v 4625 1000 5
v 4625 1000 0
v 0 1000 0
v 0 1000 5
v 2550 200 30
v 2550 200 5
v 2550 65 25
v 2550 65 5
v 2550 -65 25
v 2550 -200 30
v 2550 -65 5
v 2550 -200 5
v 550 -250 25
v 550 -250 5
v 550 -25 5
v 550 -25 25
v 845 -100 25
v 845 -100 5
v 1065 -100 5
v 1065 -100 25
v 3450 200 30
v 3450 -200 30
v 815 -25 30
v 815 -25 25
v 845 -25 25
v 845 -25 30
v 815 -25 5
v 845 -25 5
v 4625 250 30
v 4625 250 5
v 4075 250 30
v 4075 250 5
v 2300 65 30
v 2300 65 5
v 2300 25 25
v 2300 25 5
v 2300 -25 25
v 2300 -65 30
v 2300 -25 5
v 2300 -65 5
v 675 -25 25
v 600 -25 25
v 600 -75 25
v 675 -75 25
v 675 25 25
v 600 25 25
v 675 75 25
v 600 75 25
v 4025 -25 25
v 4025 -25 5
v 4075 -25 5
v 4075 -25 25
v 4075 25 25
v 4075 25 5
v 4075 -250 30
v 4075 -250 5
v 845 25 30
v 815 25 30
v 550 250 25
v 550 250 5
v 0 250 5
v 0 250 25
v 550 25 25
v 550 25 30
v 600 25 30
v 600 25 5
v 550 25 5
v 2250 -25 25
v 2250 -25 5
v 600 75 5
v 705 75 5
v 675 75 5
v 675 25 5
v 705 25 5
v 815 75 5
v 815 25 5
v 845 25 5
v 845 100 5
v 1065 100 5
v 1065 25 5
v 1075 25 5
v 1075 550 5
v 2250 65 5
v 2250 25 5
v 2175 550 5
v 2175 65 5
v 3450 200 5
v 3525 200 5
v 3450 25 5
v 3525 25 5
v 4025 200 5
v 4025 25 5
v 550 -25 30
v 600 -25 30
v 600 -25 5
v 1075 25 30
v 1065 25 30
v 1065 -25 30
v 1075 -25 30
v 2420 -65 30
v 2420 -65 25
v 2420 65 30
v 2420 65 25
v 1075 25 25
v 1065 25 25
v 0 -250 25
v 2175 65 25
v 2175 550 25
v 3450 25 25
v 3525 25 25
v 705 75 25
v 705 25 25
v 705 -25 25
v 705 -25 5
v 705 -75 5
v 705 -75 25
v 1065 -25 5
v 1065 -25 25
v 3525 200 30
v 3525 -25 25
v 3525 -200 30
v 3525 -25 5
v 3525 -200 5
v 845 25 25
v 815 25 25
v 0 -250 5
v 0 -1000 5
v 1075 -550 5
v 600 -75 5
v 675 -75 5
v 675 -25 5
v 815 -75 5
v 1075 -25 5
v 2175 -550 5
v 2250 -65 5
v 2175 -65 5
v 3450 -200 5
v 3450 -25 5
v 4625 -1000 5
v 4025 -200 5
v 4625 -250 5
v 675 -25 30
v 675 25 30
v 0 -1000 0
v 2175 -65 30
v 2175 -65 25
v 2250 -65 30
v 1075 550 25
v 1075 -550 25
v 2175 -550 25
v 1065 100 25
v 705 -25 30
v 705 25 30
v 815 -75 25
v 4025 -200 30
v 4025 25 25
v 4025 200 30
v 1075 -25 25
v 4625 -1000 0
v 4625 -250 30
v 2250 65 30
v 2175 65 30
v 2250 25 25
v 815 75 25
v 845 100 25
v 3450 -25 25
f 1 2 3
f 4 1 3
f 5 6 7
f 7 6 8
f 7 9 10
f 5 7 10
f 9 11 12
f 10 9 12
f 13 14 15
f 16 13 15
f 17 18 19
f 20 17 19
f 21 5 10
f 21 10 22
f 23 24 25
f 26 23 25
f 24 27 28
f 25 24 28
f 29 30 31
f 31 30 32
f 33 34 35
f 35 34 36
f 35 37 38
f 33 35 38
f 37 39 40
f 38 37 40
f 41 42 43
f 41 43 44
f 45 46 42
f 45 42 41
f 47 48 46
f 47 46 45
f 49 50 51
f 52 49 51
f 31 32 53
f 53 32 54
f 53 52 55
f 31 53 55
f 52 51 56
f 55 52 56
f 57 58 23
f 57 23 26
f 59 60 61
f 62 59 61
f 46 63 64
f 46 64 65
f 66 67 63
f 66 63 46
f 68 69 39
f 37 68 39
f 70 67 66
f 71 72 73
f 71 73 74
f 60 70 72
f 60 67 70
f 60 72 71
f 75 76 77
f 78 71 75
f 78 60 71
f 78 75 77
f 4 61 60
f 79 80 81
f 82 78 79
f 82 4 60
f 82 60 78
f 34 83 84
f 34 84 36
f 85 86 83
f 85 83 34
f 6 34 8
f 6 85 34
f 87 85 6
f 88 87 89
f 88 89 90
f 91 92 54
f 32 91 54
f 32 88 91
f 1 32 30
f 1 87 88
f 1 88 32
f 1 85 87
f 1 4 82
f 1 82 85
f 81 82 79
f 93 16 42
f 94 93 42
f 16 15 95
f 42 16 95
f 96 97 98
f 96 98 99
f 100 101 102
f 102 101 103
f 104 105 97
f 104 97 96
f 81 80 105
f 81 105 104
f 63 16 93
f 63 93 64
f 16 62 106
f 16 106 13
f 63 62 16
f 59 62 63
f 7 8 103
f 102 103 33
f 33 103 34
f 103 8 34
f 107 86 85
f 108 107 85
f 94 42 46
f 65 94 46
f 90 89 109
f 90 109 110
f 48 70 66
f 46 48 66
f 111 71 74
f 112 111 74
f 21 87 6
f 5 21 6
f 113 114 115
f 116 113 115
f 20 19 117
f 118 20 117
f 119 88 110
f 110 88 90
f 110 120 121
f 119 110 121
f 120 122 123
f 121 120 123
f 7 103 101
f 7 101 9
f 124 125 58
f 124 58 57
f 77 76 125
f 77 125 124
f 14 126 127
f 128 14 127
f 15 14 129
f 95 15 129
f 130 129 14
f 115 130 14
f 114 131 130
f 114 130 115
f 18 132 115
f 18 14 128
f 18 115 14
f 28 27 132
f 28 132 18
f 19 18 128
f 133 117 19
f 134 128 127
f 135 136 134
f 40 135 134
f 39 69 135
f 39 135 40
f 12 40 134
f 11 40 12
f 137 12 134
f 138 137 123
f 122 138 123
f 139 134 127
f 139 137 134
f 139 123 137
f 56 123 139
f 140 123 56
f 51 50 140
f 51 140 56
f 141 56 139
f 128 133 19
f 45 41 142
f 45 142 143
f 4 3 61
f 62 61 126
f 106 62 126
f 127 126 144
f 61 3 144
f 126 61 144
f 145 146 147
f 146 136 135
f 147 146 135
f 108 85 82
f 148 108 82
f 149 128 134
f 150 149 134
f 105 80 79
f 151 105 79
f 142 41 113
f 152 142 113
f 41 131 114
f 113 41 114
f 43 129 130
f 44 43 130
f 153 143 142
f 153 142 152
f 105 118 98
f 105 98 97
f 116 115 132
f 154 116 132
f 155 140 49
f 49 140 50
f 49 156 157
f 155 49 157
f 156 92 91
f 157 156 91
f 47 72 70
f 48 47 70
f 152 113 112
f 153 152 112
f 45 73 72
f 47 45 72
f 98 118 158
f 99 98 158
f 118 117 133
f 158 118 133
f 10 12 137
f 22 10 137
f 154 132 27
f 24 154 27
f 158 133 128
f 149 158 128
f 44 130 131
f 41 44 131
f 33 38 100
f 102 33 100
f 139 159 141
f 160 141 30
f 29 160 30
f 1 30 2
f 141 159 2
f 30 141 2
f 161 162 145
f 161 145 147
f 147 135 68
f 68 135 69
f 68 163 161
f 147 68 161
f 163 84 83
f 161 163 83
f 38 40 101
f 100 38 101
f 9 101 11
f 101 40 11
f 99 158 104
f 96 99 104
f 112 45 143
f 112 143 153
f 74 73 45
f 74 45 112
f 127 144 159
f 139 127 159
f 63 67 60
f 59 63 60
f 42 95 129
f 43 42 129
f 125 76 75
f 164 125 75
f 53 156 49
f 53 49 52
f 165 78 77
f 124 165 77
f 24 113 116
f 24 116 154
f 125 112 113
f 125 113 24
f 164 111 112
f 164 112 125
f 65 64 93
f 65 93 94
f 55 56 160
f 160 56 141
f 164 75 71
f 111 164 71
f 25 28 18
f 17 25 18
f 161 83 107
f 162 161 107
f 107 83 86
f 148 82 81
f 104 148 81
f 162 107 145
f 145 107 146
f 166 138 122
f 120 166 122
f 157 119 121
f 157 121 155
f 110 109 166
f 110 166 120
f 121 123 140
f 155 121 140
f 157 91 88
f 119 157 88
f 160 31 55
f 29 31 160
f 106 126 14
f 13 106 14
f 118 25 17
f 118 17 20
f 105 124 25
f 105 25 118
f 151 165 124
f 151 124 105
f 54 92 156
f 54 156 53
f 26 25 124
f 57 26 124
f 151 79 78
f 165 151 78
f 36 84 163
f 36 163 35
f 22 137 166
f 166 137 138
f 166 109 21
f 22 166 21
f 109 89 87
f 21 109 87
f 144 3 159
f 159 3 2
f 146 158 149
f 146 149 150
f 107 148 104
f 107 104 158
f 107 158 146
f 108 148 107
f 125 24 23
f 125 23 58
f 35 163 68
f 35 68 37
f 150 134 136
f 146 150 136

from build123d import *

# Parameters (mm, degrees)
F0_W     = 50
F0_H     = 50
F0_W_2   = 30
F0_W_3   = 10
F0_W_4   = 130
F0_H_2   = 130
F0_W_5   = 75
F1_DEPTH = 25
F2_DEPTH = 5
F3_DEPTH = 30


with BuildPart() as f1:
    # F0 (on Top) → F1 (new body)
    with BuildSketch(Plane.XY):
        Polygon((550, 250), (0, 250), (0, -250), (550, -250), (550, -25), (550, 25), align=None)
        with Locations((575, 0)):
            Rectangle(F0_W, F0_H)
        Polygon((600, 75), (600, 25), (600, -25), (600, -75), (675, -75), (675, -25), (675, 25), (675, 75), align=None)
        with Locations((690, 0)):
            Rectangle(F0_W_2, F0_H)
        Polygon((705, 75), (705, 25), (705, -25), (705, -75), (815, -75), (815, -25), (815, 25), (815, 75), align=None)
        with Locations((830, 0)):
            Rectangle(F0_W_2, F0_H)
        Polygon((845, 100), (845, 25), (845, -25), (845, -100), (1065, -100), (1065, -25), (1065, 25), (1065, 100), align=None)
        with Locations((1070, 0)):
            Rectangle(F0_W_3, F0_H)
        Polygon((1075, 550), (1075, 25), (1075, -25), (1075, -550), (2175, -550), (2175, -65), (2175, 65), (2175, 550), align=None)
        Polygon((2250, -25), (2250, 25), (2250, 65), (2175, 65), (2175, -65), (2250, -65), align=None)
        with Locations((2275, 0)):
            Rectangle(F0_W, F0_H)
        Polygon((2420, -65), (2420, 65), (2300, 65), (2300, 25), (2300, -25), (2300, -65), align=None)
        with Locations((2485, 0)):
            Rectangle(F0_W_4, F0_H_2)
        Polygon((3450, -25), (3450, 25), (3450, 200), (2550, 200), (2550, 65), (2550, -65), (2550, -200), (3450, -200), align=None)
        with Locations((3487.5, 0)):
            Rectangle(F0_W_5, F0_H)
        Polygon((4025, -25), (4025, 25), (4025, 200), (3525, 200), (3525, 25), (3525, -25), (3525, -200), (4025, -200), align=None)
        with Locations((4050, 0)):
            Rectangle(F0_W, F0_H)
        Polygon((4625, -250), (4625, 250), (4075, 250), (4075, 25), (4075, -25), (4075, -250), align=None)
    extrude(amount=F1_DEPTH)

    # F0 (on Top) → F2 (join)
    with BuildSketch(Plane.XY):
        Polygon((4625, 1000), (0, 1000), (0, 250), (550, 250), (550, 25), (600, 25), (600, 75), (675, 75), (675, 25), (705, 25), (705, 75), (815, 75), (815, 25), (845, 25), (845, 100), (1065, 100), (1065, 25), (1075, 25), (1075, 550), (2175, 550), (2175, 65), (2250, 65), (2250, 25), (2300, 25), (2300, 65), (2420, 65), (2550, 65), (2550, 200), (3450, 200), (3450, 25), (3525, 25), (3525, 200), (4025, 200), (4025, 25), (4075, 25), (4075, 250), (4625, 250), align=None)
        Polygon((550, 250), (0, 250), (0, -250), (550, -250), (550, -25), (550, 25), align=None)
        Polygon((4625, -250), (4625, 250), (4075, 250), (4075, 25), (4075, -25), (4075, -250), align=None)
        Polygon((550, -250), (0, -250), (0, -1000), (4625, -1000), (4625, -250), (4075, -250), (4075, -25), (4025, -25), (4025, -200), (3525, -200), (3525, -25), (3450, -25), (3450, -200), (2550, -200), (2550, -65), (2420, -65), (2300, -65), (2300, -25), (2250, -25), (2250, -65), (2175, -65), (2175, -550), (1075, -550), (1075, -25), (1065, -25), (1065, -100), (845, -100), (845, -25), (815, -25), (815, -75), (705, -75), (705, -25), (675, -25), (675, -75), (600, -75), (600, -25), (550, -25), align=None)
    extrude(amount=F2_DEPTH)

    # F0 (on Top) → F3 (join)
    with BuildSketch(Plane.XY):
        with Locations((575, 0)):
            Rectangle(F0_W, F0_H)
        with Locations((690, 0)):
            Rectangle(F0_W_2, F0_H)
        with Locations((830, 0)):
            Rectangle(F0_W_2, F0_H)
        with Locations((1070, 0)):
            Rectangle(F0_W_3, F0_H)
        Polygon((2250, -25), (2250, 25), (2250, 65), (2175, 65), (2175, -65), (2250, -65), align=None)
        Polygon((2420, -65), (2420, 65), (2300, 65), (2300, 25), (2300, -25), (2300, -65), align=None)
        Polygon((3450, -25), (3450, 25), (3450, 200), (2550, 200), (2550, 65), (2550, -65), (2550, -200), (3450, -200), align=None)
        Polygon((4025, -25), (4025, 25), (4025, 200), (3525, 200), (3525, 25), (3525, -25), (3525, -200), (4025, -200), align=None)
        Polygon((4625, -250), (4625, 250), (4075, 250), (4075, 25), (4075, -25), (4075, -250), align=None)
    extrude(amount=F3_DEPTH)


solid = f1.part
